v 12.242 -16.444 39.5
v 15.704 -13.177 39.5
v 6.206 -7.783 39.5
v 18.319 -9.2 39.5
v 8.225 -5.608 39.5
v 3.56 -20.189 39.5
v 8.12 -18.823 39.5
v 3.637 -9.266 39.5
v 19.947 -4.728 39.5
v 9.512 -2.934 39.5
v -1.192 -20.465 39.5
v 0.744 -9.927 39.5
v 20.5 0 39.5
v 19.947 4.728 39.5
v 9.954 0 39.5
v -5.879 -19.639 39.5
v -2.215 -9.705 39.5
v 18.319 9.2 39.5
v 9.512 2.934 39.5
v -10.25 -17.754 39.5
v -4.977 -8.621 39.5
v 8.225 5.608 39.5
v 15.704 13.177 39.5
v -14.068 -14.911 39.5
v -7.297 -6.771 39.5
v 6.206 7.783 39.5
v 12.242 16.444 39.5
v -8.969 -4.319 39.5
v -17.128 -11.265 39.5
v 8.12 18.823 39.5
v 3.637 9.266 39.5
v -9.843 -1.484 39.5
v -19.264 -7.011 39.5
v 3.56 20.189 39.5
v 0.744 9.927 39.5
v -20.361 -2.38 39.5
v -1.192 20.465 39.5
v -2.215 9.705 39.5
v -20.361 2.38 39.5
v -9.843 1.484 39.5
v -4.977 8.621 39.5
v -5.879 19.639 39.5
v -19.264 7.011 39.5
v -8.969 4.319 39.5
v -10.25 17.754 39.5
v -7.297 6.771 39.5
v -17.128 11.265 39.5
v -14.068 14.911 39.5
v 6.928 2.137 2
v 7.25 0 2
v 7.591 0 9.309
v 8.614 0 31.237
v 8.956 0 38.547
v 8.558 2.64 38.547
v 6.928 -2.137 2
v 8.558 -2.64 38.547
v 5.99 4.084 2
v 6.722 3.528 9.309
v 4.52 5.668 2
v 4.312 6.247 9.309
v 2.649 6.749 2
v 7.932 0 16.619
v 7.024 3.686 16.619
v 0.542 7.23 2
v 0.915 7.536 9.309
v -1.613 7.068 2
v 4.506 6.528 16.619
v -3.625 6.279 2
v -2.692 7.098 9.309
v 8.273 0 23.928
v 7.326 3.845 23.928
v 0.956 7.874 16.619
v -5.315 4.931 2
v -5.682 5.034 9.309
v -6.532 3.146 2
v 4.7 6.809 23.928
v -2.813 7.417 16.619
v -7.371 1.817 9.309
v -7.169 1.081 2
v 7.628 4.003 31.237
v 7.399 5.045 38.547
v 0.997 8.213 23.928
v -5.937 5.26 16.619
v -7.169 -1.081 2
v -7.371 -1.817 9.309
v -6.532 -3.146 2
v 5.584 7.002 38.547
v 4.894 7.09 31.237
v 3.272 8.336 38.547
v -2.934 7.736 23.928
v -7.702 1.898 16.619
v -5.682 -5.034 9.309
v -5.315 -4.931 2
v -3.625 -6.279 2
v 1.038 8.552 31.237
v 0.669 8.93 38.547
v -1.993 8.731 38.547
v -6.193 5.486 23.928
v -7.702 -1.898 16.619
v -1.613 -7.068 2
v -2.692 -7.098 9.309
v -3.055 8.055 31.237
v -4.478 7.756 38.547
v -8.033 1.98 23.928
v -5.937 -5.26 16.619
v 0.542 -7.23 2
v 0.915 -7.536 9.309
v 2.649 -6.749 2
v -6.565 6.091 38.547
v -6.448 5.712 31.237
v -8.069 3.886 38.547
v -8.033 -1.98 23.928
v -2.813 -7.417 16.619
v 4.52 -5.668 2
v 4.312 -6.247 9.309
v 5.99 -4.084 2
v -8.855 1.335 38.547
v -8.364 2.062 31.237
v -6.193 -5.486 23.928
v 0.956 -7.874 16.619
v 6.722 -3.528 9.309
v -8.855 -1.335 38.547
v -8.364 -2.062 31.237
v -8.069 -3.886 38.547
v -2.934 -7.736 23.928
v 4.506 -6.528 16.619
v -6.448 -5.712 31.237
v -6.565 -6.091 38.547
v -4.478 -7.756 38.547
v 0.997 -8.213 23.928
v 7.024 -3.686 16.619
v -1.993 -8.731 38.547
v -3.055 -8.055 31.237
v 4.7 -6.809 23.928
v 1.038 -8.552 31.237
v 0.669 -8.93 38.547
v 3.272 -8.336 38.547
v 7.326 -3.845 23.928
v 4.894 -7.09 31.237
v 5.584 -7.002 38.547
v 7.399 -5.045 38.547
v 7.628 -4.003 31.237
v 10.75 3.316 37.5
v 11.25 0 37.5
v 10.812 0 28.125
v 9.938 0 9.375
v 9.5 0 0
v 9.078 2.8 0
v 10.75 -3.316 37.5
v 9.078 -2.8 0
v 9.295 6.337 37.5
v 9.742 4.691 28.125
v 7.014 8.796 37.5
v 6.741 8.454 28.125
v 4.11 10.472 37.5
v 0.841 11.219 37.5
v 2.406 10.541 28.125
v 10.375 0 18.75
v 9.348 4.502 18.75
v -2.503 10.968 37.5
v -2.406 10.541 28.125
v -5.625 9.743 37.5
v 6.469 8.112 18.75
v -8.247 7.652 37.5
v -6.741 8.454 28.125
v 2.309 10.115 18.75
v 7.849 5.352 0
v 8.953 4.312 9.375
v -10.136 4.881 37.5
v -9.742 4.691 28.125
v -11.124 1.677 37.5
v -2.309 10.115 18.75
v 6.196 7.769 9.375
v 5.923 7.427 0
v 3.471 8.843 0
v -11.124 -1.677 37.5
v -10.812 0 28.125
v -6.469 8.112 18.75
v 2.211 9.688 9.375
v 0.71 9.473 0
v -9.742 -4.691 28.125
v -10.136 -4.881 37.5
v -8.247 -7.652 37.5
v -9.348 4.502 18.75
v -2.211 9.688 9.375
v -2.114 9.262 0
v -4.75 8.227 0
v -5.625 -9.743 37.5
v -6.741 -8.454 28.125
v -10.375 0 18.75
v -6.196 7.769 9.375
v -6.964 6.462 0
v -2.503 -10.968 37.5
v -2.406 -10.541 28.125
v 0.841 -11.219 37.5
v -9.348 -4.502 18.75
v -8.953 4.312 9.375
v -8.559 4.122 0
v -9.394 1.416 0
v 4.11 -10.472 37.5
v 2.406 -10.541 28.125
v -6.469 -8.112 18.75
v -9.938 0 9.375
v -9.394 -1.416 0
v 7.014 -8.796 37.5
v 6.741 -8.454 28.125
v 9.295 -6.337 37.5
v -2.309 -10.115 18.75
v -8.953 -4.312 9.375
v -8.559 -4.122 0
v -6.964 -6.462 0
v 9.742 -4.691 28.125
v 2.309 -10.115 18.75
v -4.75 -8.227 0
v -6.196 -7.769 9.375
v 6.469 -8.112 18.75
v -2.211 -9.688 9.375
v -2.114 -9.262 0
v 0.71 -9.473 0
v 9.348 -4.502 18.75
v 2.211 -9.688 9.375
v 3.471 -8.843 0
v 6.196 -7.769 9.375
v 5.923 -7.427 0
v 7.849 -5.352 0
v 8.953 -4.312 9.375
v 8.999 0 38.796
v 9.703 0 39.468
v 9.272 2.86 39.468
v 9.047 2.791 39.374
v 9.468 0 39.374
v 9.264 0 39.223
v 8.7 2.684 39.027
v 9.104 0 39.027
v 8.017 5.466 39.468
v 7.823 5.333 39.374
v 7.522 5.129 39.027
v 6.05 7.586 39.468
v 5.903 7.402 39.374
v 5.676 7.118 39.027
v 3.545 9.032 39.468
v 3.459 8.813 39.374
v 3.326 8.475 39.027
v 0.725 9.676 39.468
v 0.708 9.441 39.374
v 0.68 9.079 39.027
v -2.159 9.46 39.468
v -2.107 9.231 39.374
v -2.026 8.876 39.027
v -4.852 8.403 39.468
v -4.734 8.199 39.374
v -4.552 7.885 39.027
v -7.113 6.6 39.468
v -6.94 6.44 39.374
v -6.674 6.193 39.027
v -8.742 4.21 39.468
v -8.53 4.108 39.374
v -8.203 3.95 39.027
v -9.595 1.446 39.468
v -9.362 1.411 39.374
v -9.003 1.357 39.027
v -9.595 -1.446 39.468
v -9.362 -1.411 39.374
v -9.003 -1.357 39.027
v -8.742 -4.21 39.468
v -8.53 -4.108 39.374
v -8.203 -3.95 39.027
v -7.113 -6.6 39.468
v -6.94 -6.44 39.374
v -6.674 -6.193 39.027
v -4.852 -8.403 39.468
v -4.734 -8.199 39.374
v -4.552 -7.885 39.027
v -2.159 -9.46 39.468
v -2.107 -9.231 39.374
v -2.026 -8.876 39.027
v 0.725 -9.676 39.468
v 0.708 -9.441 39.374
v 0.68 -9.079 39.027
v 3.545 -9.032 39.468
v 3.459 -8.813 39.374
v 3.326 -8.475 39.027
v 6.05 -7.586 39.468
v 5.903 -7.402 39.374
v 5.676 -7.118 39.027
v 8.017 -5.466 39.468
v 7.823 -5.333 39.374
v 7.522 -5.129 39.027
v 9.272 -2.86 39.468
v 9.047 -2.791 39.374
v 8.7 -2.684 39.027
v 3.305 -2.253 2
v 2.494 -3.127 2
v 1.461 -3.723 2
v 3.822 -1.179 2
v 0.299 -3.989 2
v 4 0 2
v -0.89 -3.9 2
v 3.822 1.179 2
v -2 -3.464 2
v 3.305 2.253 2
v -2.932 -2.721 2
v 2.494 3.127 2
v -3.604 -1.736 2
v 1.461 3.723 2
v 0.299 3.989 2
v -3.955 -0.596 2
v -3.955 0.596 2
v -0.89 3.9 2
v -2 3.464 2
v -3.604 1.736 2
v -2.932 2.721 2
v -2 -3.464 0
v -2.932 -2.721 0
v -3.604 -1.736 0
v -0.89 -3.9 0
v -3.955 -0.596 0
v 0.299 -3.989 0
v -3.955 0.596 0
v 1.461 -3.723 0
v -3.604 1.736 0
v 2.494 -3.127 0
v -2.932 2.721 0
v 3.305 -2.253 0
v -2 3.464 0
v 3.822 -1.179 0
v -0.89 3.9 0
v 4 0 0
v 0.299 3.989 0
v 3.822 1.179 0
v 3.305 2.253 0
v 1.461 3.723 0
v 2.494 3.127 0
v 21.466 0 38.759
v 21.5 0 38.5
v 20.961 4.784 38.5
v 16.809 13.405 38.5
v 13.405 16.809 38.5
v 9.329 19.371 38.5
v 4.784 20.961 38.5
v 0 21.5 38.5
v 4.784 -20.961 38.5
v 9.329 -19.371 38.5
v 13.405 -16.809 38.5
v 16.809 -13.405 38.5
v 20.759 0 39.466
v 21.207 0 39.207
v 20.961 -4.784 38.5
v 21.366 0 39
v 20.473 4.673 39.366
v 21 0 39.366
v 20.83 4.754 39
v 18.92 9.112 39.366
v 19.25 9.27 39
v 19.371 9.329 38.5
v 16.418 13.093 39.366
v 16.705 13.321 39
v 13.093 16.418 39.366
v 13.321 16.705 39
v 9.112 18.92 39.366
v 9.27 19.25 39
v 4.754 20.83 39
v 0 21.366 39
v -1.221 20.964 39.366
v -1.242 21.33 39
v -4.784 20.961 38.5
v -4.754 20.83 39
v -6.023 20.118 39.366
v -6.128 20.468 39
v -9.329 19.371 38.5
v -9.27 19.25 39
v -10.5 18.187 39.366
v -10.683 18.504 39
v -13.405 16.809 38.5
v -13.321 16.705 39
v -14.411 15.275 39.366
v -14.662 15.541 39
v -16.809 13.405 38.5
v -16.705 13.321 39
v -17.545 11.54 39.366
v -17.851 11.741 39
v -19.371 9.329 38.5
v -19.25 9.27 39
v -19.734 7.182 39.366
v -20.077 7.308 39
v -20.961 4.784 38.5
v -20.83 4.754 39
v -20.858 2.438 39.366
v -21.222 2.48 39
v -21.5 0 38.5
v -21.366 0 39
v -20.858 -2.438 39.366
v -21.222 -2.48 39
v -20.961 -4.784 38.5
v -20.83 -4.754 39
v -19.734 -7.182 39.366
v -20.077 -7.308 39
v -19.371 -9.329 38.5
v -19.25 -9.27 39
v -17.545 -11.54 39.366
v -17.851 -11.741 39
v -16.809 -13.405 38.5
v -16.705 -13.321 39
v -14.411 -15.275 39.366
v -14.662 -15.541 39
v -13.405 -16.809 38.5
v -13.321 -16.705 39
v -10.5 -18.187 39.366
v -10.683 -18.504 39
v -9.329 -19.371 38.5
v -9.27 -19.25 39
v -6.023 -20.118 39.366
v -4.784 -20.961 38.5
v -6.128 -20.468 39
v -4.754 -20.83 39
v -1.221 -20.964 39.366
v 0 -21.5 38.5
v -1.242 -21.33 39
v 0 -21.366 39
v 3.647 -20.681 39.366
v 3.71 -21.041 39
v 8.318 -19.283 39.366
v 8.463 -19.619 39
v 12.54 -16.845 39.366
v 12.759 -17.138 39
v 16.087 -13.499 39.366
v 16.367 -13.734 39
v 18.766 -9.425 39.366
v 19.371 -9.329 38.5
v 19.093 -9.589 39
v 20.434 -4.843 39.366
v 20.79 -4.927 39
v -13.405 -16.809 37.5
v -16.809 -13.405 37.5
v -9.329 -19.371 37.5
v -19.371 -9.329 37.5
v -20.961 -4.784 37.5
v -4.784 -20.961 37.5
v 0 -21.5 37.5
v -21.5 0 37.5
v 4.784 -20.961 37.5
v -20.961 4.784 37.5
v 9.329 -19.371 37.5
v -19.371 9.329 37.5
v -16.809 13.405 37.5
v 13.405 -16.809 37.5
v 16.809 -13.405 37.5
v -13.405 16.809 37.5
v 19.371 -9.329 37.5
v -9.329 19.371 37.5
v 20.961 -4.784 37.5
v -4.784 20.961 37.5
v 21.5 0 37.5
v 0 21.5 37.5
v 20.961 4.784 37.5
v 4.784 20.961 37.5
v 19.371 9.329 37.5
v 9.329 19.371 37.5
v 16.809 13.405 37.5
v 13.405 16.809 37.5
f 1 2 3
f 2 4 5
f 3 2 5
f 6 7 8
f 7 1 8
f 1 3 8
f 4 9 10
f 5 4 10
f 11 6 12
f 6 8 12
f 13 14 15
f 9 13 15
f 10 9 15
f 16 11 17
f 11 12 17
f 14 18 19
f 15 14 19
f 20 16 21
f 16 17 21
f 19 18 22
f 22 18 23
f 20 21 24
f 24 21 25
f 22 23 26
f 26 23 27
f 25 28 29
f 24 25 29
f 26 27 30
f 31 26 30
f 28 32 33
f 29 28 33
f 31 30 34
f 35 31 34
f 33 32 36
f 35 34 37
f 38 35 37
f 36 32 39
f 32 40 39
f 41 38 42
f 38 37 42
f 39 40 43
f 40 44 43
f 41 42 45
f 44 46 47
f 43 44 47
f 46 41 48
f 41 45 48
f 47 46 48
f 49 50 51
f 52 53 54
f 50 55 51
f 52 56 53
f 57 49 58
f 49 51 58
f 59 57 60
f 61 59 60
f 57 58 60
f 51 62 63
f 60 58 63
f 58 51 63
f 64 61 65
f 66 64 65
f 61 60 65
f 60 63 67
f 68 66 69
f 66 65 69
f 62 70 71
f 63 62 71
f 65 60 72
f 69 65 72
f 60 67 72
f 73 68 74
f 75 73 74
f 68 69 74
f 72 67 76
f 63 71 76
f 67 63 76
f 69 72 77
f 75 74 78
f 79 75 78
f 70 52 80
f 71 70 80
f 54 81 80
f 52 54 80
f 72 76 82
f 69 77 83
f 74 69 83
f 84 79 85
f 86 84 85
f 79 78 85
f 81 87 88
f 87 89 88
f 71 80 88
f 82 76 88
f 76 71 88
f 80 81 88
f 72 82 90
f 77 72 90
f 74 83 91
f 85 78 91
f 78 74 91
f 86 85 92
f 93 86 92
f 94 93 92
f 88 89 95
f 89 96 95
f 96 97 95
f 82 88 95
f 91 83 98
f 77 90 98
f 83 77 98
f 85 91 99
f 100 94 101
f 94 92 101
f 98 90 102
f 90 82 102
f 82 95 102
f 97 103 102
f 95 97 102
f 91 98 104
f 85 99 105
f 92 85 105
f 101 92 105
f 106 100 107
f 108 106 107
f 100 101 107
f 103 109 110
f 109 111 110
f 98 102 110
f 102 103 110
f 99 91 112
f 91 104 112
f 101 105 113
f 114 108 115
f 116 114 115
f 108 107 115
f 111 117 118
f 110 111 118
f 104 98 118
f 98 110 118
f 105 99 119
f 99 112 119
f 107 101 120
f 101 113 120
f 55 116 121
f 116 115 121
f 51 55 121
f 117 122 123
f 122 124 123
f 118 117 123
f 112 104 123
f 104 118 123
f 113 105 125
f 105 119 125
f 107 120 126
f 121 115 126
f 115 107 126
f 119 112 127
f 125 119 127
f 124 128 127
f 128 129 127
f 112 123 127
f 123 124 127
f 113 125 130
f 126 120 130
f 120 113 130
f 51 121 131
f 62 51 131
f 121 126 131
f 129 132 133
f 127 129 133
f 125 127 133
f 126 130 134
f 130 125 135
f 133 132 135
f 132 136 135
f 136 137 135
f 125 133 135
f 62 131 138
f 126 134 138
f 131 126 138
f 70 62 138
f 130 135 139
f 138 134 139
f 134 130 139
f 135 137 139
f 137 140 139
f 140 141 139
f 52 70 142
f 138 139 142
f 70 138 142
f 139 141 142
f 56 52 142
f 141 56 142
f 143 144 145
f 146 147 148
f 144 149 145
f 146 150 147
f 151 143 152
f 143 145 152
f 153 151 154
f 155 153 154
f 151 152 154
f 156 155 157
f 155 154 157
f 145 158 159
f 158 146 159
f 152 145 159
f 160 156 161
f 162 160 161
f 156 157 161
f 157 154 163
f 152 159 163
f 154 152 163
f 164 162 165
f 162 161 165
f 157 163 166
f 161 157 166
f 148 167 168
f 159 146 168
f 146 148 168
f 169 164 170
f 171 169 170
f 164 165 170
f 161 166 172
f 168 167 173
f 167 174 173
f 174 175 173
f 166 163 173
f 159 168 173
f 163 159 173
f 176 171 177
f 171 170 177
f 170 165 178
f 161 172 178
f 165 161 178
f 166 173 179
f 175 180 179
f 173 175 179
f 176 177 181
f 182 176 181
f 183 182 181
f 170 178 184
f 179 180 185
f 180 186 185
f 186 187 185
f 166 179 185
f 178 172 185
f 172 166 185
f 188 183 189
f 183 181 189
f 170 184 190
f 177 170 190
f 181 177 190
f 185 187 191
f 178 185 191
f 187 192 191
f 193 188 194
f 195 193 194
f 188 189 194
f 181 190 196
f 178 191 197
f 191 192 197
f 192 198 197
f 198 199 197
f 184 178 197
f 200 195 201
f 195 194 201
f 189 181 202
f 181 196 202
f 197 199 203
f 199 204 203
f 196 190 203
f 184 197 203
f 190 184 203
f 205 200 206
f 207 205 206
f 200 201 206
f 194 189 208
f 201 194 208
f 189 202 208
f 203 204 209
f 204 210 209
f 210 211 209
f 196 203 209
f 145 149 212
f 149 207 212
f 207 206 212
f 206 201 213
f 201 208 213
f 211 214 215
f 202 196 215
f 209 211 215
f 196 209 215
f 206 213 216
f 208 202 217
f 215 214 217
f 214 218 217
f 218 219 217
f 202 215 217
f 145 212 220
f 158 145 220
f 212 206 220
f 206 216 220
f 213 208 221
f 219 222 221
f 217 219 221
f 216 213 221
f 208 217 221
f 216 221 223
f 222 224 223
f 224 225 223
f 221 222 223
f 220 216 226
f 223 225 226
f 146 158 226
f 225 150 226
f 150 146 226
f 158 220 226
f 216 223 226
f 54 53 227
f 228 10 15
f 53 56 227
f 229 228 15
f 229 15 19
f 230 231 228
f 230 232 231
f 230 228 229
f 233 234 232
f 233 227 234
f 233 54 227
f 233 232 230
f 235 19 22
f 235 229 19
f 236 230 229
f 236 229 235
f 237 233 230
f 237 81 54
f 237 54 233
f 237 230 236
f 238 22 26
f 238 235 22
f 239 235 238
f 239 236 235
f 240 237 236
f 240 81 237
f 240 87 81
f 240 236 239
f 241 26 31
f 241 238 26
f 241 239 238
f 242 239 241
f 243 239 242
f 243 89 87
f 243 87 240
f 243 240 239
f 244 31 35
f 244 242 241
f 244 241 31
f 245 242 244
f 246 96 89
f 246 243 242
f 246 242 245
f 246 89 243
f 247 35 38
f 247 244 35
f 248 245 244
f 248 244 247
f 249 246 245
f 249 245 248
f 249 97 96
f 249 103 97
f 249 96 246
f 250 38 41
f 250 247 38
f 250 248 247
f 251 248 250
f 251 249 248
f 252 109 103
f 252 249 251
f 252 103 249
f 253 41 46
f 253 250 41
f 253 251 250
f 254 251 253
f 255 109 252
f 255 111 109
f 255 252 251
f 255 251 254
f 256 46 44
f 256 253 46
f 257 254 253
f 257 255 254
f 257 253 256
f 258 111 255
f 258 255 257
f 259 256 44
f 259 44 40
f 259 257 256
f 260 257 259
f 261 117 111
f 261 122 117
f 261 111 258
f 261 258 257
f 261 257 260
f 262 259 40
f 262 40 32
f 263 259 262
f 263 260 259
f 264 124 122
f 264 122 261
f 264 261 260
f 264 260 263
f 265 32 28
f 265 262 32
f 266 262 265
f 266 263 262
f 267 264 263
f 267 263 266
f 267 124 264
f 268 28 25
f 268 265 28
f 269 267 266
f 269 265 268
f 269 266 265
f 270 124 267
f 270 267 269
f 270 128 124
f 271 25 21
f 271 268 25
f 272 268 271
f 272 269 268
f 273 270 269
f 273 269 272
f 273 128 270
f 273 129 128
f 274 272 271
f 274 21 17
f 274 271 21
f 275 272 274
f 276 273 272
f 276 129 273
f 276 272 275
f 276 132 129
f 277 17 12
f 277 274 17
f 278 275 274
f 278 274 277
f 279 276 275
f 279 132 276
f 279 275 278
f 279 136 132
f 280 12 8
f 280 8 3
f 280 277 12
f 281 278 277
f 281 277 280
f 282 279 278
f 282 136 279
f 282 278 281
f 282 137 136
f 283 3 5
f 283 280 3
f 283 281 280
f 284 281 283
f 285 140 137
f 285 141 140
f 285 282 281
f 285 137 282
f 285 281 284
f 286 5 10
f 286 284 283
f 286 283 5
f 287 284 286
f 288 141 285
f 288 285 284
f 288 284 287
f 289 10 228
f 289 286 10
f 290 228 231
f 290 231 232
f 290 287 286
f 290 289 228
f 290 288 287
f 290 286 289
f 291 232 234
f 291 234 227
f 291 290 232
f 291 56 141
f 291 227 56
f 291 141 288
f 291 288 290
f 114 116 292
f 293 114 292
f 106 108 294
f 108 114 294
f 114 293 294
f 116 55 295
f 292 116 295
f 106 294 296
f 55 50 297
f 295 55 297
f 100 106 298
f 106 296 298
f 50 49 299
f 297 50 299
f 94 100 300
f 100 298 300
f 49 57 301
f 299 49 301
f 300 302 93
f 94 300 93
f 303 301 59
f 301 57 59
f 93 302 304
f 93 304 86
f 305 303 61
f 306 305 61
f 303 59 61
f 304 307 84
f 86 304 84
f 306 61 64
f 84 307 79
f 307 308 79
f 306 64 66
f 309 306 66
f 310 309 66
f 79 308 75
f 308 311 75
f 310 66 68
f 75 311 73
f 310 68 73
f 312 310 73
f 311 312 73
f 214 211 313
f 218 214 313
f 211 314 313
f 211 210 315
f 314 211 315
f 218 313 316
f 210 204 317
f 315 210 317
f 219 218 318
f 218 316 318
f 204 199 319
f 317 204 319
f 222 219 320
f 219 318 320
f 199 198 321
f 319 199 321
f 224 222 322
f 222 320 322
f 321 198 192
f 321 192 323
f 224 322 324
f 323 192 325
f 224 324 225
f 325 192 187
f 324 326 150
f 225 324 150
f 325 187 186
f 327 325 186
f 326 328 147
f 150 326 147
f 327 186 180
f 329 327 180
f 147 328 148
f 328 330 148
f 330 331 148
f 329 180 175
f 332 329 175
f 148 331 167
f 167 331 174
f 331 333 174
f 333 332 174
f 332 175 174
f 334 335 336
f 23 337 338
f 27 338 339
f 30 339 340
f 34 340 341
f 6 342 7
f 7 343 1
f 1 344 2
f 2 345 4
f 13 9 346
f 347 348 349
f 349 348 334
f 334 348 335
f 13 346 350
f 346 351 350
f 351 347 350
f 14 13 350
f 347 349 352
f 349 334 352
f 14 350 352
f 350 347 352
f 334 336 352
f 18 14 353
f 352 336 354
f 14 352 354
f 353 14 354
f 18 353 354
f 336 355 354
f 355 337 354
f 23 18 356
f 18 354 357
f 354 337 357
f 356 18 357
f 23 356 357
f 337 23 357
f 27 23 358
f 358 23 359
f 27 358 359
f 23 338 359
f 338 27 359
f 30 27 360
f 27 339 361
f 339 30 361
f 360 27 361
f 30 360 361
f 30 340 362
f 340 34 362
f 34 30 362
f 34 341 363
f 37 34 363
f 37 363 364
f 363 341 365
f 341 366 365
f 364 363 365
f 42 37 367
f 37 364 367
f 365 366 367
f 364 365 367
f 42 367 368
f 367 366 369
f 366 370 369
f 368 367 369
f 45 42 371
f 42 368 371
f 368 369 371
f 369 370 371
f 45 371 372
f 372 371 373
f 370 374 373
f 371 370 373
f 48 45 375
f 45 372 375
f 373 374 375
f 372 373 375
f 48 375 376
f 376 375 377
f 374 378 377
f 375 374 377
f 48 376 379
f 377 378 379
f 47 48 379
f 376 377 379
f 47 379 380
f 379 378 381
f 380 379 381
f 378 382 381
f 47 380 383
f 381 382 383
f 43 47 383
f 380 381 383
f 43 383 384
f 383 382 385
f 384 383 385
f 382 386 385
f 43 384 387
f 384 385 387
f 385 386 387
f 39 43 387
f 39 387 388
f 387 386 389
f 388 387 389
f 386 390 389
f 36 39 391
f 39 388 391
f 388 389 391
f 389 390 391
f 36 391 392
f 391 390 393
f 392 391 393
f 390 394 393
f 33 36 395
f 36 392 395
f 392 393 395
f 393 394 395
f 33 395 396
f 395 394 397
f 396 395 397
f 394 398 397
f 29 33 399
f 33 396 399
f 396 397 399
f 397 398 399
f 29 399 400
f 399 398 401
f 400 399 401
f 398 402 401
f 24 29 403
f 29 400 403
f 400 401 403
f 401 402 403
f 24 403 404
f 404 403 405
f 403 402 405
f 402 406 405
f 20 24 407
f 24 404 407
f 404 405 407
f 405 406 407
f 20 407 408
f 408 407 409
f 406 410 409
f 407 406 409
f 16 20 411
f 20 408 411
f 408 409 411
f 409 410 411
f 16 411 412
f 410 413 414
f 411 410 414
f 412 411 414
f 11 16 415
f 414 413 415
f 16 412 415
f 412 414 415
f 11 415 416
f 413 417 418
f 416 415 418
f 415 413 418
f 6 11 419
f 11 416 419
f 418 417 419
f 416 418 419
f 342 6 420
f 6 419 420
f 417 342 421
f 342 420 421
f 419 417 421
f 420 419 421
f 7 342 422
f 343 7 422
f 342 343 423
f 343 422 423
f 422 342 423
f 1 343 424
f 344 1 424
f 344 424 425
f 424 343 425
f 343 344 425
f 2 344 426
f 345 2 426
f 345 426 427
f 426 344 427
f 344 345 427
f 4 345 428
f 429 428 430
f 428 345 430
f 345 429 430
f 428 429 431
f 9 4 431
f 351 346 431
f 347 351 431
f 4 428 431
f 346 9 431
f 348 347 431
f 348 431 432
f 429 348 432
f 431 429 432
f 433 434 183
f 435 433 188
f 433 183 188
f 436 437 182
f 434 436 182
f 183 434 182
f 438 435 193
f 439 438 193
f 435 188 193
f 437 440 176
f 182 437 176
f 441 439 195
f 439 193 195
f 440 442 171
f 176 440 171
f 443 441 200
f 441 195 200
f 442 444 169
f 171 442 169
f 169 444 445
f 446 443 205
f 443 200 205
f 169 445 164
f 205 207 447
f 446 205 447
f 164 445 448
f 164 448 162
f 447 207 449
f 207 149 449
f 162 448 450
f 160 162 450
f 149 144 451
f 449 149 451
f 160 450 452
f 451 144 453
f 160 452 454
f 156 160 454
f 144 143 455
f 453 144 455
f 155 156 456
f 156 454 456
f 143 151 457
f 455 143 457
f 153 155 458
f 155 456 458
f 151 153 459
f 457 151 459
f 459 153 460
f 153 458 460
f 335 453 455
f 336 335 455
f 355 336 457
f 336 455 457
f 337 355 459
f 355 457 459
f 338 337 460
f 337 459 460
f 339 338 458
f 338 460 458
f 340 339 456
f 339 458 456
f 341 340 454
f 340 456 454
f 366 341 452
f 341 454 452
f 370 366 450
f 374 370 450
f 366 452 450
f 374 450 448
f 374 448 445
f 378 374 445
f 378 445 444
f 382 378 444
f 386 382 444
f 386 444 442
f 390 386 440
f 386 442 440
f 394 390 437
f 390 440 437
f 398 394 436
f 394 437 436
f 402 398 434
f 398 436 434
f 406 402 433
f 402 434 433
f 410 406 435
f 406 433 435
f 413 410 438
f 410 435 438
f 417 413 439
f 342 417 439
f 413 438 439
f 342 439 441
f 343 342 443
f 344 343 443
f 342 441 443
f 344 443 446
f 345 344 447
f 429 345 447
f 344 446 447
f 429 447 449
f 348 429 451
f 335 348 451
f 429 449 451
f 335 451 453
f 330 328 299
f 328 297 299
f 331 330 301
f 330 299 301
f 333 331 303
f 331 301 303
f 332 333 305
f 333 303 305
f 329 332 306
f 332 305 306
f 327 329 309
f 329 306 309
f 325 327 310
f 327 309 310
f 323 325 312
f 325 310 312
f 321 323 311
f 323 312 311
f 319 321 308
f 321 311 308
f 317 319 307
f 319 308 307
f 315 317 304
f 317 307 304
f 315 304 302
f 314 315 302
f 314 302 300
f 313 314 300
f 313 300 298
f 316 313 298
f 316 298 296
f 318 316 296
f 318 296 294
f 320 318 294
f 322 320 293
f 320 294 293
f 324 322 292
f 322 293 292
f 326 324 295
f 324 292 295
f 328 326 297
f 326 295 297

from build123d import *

# Parameters (mm, degrees)
FILLET_R = 1


with BuildPart() as part:
    # Sketch → Revolution (revolve)
    with BuildSketch(Plane.XZ):
        Polygon((9, 39.5), (21.5, 39.5), (21.5, 37.5), (11.25, 37.5), (9.5, 0), (4, 0), (4, 2), (7.25, 2), align=None)
    revolve(axis=Axis((0, 0, 0), (0, 0, 1)))

    # Fillet
    fillet_edges = [part.edges().sort_by_distance(p)[0] for p in [
        (-21.5, 0, 39.5),
        (-9, 0, 39.5),
    ]]
    fillet(fillet_edges, radius=FILLET_R)


solid = part.part
